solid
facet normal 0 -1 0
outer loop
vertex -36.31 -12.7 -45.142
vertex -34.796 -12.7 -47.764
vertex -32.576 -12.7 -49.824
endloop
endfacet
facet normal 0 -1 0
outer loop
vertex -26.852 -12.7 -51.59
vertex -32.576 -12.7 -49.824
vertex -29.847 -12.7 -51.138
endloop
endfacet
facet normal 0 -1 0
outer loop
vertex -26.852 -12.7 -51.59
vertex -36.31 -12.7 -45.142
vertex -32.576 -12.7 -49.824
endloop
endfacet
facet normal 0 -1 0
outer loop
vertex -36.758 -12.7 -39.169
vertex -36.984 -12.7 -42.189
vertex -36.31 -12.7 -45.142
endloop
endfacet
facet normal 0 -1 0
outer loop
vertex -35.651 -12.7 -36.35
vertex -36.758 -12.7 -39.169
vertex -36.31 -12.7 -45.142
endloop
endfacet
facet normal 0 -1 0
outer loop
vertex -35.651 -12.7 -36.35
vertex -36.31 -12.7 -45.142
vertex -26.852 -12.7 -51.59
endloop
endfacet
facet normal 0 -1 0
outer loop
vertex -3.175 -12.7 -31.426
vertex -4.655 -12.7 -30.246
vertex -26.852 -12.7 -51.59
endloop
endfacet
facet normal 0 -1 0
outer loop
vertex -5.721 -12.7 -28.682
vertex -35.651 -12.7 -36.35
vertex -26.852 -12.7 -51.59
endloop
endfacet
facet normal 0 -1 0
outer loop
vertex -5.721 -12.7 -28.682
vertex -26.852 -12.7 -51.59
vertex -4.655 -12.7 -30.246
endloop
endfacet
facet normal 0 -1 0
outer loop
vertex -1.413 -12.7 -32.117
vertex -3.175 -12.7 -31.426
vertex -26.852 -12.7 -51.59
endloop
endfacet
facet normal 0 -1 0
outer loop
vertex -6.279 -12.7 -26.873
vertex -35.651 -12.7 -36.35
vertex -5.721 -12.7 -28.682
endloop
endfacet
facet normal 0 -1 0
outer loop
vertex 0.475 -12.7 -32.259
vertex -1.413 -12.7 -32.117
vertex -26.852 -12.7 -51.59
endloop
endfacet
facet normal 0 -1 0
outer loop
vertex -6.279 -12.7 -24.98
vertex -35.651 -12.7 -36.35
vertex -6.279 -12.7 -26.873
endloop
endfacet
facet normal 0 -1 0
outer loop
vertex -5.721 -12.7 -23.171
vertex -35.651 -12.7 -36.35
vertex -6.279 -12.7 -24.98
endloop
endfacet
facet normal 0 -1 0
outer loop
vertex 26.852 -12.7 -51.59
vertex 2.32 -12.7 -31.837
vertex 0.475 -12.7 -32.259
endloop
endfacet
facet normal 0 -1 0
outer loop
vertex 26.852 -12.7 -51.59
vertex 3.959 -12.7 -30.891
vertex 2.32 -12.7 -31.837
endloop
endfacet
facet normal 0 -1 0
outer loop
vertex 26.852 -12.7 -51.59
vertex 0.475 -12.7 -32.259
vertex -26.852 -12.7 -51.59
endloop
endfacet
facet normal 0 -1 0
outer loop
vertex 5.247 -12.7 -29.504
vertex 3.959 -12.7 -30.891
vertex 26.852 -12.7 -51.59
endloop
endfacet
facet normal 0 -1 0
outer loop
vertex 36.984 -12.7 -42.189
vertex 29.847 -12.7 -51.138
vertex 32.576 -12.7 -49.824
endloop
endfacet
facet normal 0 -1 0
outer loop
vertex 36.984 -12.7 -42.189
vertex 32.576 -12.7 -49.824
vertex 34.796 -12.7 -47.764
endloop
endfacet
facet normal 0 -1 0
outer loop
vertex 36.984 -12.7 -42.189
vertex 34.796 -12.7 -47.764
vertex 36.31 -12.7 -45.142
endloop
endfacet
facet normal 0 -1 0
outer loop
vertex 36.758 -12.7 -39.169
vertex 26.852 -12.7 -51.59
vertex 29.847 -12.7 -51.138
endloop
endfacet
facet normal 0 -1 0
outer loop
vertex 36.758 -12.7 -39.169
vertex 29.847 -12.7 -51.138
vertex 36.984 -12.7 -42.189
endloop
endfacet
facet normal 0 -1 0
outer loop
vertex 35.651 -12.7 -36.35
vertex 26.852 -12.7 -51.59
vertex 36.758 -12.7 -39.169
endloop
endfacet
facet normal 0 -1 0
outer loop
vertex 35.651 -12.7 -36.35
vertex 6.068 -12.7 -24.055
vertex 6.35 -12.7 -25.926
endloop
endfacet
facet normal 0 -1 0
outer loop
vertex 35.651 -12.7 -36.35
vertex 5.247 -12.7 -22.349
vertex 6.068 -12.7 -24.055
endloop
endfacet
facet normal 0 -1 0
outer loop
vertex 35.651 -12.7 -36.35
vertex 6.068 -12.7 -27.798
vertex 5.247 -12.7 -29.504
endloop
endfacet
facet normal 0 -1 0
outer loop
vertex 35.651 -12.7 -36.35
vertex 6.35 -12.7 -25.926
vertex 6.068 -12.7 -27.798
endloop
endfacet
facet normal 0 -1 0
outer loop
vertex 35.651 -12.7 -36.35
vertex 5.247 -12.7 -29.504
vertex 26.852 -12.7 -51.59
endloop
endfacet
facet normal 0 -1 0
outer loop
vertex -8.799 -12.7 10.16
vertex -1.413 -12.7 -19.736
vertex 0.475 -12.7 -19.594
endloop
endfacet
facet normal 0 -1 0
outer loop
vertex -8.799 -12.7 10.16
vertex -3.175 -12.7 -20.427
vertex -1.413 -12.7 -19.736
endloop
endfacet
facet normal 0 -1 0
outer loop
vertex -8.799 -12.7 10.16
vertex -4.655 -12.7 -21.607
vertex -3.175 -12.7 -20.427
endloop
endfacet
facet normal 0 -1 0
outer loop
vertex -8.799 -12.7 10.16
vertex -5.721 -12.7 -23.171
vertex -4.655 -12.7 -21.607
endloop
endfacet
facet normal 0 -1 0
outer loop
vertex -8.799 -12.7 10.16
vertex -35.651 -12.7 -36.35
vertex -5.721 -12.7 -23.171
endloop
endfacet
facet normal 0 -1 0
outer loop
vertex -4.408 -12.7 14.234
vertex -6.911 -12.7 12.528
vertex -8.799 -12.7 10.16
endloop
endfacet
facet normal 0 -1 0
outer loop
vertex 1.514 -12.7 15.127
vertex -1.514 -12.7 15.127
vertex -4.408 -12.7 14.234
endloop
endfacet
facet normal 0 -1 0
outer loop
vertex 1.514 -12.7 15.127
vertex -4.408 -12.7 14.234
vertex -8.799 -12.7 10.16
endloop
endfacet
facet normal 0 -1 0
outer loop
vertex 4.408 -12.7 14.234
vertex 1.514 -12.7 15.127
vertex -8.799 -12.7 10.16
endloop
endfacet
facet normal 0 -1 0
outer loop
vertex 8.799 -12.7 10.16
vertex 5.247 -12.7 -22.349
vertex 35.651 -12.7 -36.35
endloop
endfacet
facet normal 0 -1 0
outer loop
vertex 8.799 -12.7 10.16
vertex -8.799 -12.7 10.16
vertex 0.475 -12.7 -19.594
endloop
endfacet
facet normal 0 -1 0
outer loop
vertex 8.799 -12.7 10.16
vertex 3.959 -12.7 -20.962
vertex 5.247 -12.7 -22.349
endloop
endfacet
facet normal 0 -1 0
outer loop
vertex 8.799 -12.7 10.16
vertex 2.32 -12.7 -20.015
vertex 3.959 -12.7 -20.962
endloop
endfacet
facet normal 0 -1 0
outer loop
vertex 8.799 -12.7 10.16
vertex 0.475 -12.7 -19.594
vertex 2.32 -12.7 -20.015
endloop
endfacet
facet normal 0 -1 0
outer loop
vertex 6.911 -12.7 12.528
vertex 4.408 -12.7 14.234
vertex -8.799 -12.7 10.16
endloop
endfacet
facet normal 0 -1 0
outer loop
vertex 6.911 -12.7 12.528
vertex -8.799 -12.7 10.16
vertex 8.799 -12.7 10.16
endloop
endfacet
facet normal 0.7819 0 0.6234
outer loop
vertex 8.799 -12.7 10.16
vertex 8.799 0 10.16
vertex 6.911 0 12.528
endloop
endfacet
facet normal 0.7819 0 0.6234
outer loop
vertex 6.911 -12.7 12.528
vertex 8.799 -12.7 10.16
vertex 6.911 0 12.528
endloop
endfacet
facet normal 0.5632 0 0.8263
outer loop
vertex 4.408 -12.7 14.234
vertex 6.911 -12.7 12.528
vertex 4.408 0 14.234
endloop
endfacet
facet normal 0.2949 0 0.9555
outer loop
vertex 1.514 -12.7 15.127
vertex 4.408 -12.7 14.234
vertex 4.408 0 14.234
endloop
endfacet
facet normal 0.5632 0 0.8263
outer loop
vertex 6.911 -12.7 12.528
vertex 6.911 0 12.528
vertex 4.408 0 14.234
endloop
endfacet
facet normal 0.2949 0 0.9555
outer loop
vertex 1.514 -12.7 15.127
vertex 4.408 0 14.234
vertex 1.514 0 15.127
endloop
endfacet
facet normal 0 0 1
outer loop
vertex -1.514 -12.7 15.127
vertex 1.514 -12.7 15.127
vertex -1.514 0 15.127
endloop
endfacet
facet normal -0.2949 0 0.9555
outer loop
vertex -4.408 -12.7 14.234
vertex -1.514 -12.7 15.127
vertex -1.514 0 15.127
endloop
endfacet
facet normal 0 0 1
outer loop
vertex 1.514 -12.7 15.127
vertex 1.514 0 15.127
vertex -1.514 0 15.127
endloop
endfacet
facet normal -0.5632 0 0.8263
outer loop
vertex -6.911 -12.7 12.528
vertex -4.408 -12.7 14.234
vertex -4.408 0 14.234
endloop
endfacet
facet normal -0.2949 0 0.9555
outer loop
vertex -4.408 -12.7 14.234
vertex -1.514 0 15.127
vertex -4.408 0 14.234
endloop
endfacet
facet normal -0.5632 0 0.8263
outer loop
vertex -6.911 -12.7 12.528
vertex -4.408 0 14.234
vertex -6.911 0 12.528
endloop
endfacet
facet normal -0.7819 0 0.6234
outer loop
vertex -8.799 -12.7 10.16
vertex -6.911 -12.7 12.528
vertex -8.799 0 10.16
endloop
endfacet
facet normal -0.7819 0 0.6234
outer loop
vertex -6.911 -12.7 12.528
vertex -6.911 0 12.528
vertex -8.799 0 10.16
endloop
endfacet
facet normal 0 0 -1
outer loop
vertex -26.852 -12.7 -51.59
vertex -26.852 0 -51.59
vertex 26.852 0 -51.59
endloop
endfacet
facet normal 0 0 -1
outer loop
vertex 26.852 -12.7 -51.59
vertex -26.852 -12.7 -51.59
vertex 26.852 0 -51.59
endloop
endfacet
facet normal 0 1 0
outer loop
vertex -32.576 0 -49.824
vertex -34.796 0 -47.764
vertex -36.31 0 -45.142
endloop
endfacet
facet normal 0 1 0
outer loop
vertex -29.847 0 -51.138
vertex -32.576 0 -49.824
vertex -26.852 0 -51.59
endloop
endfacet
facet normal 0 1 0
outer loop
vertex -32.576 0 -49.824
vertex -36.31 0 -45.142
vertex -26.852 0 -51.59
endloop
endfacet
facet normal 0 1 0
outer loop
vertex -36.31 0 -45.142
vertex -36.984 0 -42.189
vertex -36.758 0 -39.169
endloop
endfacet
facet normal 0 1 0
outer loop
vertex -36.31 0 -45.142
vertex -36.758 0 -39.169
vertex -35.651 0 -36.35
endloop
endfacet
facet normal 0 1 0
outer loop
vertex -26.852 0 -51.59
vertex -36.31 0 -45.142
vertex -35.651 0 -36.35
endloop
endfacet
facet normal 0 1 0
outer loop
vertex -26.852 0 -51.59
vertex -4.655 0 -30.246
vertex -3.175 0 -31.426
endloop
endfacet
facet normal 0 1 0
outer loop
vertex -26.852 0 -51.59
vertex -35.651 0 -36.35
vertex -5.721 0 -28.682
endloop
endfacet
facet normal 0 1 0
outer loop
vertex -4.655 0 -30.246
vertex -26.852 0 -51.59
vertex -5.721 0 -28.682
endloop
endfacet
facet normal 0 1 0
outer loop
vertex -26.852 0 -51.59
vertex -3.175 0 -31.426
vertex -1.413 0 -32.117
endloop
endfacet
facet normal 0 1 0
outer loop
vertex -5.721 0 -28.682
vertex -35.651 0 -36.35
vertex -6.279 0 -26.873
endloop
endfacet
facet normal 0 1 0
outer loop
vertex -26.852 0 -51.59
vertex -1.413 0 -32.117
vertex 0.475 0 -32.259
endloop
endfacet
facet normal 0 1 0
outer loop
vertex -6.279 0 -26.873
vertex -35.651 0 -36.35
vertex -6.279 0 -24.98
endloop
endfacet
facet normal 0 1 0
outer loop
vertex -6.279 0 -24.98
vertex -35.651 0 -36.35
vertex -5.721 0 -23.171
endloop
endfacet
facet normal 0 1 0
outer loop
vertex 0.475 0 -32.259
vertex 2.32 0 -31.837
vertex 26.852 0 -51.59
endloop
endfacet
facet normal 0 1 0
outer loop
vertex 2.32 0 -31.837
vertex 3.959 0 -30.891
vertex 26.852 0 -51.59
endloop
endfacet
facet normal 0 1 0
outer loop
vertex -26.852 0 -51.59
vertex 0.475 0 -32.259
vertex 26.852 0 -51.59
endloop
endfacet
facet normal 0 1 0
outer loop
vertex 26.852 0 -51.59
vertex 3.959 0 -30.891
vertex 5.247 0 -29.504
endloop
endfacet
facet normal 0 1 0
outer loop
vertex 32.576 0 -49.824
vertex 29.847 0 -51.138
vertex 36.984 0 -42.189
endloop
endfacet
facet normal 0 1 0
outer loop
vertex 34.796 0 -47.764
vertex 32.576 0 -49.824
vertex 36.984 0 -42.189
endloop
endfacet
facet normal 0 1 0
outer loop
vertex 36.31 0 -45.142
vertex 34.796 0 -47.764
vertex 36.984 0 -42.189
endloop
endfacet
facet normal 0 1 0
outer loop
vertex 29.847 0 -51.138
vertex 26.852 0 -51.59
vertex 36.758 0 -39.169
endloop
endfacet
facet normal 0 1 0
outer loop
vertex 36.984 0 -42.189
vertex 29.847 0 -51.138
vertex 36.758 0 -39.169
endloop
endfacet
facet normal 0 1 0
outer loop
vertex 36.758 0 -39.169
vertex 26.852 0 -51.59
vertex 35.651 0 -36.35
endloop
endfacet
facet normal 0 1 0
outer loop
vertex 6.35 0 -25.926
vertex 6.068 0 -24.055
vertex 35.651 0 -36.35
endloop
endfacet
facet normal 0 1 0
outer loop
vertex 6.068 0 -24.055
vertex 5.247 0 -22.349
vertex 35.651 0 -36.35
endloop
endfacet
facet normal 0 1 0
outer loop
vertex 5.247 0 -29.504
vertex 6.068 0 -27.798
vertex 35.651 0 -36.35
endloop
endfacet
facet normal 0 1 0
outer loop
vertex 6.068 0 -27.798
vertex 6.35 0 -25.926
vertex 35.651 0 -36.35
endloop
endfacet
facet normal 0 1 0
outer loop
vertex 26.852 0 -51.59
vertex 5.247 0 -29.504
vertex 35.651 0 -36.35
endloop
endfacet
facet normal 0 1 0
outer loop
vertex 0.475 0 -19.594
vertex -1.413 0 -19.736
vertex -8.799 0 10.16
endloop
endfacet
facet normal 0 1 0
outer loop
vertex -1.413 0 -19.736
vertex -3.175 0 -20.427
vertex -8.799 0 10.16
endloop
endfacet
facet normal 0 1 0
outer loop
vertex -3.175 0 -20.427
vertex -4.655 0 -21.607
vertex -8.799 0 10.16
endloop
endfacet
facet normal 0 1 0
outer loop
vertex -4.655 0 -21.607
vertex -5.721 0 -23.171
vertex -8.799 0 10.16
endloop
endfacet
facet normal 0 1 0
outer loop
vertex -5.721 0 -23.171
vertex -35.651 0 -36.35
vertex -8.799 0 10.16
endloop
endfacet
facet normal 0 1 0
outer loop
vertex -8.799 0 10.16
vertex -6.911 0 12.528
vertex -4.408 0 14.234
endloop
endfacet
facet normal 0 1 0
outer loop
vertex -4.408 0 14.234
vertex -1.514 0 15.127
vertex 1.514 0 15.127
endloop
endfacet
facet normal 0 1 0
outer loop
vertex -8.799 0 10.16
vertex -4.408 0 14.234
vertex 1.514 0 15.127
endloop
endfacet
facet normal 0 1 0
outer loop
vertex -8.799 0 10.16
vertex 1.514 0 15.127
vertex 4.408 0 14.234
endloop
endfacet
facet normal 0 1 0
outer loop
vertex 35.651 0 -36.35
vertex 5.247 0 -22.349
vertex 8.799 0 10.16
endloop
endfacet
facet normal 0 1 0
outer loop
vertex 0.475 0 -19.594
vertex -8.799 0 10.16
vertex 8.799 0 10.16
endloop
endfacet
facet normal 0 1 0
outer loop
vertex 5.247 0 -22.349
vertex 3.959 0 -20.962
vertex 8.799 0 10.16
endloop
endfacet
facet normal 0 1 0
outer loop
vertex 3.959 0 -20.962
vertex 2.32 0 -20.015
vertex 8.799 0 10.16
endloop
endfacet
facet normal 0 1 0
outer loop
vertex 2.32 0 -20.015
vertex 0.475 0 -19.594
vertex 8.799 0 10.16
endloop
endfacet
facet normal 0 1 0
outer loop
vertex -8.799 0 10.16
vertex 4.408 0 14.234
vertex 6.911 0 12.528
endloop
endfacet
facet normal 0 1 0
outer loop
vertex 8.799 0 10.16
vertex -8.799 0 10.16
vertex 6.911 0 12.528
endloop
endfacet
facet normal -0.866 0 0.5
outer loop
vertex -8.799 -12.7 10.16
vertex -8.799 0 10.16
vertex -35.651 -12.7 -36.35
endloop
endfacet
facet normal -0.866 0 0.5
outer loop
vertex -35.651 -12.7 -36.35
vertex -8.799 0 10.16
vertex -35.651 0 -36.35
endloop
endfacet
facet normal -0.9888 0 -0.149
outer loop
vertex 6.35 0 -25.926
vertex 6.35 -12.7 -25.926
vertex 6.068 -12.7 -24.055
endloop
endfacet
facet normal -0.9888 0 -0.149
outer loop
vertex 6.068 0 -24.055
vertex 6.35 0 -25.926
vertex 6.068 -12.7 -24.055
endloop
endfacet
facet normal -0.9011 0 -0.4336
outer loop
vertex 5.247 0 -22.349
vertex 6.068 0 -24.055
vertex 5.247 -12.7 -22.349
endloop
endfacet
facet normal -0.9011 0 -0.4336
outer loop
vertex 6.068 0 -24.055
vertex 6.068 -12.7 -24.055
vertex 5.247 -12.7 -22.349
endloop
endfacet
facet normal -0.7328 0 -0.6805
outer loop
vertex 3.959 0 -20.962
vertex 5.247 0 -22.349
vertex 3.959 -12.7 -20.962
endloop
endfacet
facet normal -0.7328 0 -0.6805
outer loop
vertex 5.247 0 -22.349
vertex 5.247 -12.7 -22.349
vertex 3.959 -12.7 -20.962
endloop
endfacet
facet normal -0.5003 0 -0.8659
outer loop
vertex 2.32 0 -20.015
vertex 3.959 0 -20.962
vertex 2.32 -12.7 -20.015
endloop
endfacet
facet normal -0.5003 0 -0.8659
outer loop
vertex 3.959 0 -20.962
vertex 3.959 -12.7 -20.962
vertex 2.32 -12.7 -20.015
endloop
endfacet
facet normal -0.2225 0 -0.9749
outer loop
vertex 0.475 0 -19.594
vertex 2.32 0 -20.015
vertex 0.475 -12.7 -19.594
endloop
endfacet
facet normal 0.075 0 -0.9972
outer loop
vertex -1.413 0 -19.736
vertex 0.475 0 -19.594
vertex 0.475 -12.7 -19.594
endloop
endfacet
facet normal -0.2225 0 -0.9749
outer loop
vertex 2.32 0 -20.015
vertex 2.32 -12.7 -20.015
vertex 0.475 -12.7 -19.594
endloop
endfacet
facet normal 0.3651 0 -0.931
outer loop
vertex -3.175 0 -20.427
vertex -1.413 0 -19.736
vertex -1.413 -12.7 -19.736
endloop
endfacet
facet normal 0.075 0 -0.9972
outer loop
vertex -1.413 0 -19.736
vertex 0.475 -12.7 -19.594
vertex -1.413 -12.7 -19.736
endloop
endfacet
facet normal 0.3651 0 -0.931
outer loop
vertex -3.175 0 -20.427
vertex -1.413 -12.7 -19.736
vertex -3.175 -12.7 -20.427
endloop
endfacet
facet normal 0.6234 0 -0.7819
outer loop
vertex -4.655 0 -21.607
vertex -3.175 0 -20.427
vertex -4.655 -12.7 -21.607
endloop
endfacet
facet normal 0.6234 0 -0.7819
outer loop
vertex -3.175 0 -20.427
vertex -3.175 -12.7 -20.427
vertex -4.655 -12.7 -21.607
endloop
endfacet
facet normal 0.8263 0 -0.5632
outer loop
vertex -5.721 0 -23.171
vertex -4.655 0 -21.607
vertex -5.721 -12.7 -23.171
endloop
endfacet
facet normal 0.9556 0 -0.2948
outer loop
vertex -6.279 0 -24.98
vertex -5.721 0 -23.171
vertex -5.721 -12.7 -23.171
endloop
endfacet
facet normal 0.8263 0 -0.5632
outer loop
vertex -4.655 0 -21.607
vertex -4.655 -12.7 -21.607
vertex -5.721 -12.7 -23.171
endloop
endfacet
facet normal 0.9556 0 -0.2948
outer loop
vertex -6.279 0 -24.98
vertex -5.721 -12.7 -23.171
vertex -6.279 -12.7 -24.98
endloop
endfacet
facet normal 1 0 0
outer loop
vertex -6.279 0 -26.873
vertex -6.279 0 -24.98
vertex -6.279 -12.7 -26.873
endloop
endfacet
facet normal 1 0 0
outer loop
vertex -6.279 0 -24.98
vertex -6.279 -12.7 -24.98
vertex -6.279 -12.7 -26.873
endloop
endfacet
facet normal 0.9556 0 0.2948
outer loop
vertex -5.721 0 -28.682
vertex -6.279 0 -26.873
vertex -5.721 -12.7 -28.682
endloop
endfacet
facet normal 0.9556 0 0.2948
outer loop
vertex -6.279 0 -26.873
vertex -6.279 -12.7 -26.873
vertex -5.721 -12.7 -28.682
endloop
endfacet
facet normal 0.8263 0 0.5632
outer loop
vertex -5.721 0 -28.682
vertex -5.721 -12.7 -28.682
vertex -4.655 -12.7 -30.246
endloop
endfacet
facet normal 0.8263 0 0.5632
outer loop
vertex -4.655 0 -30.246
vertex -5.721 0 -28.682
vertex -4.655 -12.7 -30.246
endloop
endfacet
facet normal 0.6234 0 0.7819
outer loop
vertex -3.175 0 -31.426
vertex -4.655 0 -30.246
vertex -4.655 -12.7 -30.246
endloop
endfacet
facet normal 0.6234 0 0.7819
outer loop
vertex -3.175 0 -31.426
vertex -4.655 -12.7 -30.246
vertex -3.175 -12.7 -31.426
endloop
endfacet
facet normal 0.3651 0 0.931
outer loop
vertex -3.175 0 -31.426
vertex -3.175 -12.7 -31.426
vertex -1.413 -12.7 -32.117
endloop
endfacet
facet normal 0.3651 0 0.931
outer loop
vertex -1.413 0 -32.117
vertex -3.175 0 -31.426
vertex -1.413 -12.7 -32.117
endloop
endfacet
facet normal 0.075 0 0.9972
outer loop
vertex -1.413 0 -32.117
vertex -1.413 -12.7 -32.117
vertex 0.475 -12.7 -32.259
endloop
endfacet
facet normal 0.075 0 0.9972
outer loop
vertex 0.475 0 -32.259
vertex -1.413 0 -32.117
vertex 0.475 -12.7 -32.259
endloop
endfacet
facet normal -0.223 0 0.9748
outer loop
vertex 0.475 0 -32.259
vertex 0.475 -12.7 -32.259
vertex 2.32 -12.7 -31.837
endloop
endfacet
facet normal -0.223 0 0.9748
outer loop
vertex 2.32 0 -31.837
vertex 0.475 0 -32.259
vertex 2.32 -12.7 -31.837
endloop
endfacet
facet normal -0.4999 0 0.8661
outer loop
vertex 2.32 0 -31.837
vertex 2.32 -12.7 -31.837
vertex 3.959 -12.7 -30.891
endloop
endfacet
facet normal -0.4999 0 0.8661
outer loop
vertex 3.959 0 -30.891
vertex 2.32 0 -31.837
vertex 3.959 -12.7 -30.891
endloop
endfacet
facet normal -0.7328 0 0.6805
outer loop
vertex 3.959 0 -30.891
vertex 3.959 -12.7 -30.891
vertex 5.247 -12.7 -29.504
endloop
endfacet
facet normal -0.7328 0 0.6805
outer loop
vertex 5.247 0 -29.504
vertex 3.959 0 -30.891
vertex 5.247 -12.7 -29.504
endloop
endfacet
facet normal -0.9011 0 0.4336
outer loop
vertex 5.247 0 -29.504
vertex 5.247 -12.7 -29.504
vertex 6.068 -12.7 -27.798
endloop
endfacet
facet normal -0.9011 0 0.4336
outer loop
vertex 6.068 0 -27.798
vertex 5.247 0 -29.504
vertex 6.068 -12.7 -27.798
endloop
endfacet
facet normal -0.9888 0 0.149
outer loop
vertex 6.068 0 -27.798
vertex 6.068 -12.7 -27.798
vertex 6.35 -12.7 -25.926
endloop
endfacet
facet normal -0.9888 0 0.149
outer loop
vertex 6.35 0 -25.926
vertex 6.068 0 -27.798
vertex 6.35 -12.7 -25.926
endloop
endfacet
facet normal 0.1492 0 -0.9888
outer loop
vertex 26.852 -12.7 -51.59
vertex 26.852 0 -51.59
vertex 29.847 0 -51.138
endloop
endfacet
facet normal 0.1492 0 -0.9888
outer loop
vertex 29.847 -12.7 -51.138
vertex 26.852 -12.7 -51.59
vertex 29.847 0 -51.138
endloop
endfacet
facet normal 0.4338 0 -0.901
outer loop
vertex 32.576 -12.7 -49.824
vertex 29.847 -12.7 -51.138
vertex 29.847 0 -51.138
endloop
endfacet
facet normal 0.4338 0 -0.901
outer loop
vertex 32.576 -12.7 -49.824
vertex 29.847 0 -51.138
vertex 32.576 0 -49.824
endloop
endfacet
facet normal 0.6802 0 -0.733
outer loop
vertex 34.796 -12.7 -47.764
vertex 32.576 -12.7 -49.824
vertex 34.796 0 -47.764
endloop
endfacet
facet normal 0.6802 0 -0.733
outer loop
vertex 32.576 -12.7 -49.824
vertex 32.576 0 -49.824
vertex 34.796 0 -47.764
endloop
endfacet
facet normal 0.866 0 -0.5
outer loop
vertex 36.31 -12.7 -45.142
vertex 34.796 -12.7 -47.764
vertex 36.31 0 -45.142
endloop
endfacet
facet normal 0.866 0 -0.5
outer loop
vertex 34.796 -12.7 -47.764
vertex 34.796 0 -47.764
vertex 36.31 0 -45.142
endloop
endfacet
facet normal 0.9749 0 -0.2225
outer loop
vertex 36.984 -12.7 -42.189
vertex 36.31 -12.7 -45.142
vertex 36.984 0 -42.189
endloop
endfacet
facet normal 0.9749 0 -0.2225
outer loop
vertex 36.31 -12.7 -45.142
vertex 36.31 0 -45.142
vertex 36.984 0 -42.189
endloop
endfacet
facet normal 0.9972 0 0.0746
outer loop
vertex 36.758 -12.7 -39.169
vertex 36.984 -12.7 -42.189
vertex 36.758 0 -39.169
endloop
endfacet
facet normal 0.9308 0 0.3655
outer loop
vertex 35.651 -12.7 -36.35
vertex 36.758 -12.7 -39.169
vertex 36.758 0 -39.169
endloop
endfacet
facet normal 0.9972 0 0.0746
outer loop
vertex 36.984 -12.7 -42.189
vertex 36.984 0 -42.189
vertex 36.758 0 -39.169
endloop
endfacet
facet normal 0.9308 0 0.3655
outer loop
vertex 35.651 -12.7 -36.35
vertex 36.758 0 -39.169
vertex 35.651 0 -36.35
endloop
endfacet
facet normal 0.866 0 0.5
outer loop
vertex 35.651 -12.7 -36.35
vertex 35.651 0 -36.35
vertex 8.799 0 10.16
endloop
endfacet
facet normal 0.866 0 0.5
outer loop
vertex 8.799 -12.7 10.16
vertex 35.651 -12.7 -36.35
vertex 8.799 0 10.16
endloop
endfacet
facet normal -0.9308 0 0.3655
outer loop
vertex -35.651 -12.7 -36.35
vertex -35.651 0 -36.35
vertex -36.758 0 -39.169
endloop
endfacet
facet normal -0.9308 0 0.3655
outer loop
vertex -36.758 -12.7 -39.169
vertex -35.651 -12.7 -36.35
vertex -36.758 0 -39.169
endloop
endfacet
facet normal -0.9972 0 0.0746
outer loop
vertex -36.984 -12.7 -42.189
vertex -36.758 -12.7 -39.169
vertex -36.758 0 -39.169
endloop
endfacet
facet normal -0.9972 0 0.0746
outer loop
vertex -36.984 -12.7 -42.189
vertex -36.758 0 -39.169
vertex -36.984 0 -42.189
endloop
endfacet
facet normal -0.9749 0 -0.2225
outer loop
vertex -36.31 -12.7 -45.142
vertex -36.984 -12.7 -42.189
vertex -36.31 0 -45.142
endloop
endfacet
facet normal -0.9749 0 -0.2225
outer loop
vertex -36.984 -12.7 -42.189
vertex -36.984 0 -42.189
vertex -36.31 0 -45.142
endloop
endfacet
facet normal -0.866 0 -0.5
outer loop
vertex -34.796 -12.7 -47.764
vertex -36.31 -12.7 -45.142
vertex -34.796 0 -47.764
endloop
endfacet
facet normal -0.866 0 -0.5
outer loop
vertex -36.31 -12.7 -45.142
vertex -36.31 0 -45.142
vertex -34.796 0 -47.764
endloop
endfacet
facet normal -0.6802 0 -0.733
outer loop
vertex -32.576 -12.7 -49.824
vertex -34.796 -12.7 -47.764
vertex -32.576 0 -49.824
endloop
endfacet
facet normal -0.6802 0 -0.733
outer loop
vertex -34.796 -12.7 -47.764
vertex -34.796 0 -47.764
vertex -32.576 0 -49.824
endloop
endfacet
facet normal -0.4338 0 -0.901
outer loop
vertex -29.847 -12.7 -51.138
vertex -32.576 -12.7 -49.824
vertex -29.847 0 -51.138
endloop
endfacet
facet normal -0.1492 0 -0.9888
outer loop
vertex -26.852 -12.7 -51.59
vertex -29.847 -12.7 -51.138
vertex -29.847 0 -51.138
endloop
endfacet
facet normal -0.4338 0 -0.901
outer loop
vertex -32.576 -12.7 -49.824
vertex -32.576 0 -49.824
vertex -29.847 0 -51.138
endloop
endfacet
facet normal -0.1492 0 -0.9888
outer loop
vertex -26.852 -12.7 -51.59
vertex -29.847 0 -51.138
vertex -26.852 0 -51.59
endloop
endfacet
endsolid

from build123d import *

# Parameters (mm, degrees)
F1_DEPTH = 12.7
F2_R     = 6.35
F3_DEPTH = 25.4


with BuildPart() as f1:
    # F0 (on Front) → F1 (new body)
    with BuildSketch(Plane.XZ):
        with BuildLine():
            ThreePointArc((8.798818, 10.16), (0, 15.24), (-8.798818, 10.16))
            Line((-8.798818, 10.16), (-35.651182, -36.349658))
            ThreePointArc((-35.651182, -36.349658), (-35.651182, -46.509658), (-26.852364, -51.589658))
            Line((-26.852364, -51.589658), (26.852364, -51.589658))
            ThreePointArc((26.852364, -51.589658), (35.651182, -46.509658), (35.651182, -36.349658))
            Line((35.651182, -36.349658), (8.798818, 10.16))
        make_face()
    extrude(amount=F1_DEPTH)

    # F2 (on face) → F3 (cut)
    with BuildSketch(Plane.XZ.offset(12.7)):
        with Locations((0, -25.926439)):
            Circle(F2_R)
    extrude(amount=-F3_DEPTH, mode=Mode.SUBTRACT)


solid = f1.part
